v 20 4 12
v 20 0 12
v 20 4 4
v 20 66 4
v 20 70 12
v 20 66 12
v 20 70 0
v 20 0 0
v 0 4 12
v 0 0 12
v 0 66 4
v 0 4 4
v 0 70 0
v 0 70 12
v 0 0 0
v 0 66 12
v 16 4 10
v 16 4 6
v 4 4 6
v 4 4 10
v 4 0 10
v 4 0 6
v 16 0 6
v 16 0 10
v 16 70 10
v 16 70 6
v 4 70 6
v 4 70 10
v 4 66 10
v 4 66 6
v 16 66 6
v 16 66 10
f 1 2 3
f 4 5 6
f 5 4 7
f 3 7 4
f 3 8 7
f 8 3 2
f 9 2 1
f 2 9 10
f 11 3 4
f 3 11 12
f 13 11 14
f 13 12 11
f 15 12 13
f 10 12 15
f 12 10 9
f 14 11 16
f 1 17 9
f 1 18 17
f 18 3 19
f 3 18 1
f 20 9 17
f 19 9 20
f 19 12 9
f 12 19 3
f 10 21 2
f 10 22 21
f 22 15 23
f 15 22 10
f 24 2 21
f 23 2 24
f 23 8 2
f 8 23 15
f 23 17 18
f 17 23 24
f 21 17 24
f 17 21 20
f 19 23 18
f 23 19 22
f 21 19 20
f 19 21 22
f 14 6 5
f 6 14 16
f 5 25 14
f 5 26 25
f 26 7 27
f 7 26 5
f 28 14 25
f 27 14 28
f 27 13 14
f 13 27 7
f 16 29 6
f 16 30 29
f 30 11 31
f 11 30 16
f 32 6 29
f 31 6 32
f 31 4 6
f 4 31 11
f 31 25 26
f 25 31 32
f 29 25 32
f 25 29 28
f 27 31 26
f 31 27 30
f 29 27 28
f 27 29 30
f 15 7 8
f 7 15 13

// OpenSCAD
 /*
 * Door wreath holder
 * (c) 2020 David Mikulik
 * Licensed under 
 *   Creative Commons 
 *   Attribution Non Comercial Share alike license
 */
 
 
THIKNES = 1;
THIKNES_HOLDER=4;
WIDTH = 20;
HEIGTH=70;

DOOR_DEPTH1 = 27; 
DOOR_HEIGHT = 14;
DOOR_DEPTH2 = 15;

CABLE_WIDTH= 12;

//holderWithHook ();
holderForGlueTape();

module holderWithHook () {
    translate ([0,0,-DOOR_DEPTH1-THIKNES])
        cube ([WIDTH,THIKNES,DOOR_DEPTH1+THIKNES]);
    translate ([0,-DOOR_HEIGHT,-DOOR_DEPTH1-THIKNES])
        cube ([WIDTH,DOOR_HEIGHT,THIKNES]);
    translate ([0,-DOOR_HEIGHT-THIKNES,-DOOR_DEPTH1-THIKNES-DOOR_DEPTH2])
        cube ([WIDTH,THIKNES,DOOR_DEPTH2+THIKNES]);
    translate ([0,-DOOR_HEIGHT-THIKNES,-DOOR_DEPTH1-THIKNES*2-DOOR_DEPTH2])
        cube ([WIDTH,HEIGTH,THIKNES]);
    cube ([WIDTH,HEIGTH*1.5,THIKNES]);
    translate ([0,HEIGTH*1.5,0])
        holderForGlueTape ();
}
module holderForGlueTape  () {
    cube ([WIDTH,HEIGTH,THIKNES_HOLDER]);
    cableTie();
    translate ([0,HEIGTH-THIKNES_HOLDER,0])
        cableTie();
}

module cableTie() {
    translate ([0,0,THIKNES_HOLDER])
        difference () {
            cube ([WIDTH,THIKNES_HOLDER,THIKNES_HOLDER*2]);
            translate ([WIDTH/2-CABLE_WIDTH/2,0,THIKNES_HOLDER/2])
                cube ([CABLE_WIDTH,THIKNES_HOLDER,THIKNES_HOLDER]);
        }
    
}
